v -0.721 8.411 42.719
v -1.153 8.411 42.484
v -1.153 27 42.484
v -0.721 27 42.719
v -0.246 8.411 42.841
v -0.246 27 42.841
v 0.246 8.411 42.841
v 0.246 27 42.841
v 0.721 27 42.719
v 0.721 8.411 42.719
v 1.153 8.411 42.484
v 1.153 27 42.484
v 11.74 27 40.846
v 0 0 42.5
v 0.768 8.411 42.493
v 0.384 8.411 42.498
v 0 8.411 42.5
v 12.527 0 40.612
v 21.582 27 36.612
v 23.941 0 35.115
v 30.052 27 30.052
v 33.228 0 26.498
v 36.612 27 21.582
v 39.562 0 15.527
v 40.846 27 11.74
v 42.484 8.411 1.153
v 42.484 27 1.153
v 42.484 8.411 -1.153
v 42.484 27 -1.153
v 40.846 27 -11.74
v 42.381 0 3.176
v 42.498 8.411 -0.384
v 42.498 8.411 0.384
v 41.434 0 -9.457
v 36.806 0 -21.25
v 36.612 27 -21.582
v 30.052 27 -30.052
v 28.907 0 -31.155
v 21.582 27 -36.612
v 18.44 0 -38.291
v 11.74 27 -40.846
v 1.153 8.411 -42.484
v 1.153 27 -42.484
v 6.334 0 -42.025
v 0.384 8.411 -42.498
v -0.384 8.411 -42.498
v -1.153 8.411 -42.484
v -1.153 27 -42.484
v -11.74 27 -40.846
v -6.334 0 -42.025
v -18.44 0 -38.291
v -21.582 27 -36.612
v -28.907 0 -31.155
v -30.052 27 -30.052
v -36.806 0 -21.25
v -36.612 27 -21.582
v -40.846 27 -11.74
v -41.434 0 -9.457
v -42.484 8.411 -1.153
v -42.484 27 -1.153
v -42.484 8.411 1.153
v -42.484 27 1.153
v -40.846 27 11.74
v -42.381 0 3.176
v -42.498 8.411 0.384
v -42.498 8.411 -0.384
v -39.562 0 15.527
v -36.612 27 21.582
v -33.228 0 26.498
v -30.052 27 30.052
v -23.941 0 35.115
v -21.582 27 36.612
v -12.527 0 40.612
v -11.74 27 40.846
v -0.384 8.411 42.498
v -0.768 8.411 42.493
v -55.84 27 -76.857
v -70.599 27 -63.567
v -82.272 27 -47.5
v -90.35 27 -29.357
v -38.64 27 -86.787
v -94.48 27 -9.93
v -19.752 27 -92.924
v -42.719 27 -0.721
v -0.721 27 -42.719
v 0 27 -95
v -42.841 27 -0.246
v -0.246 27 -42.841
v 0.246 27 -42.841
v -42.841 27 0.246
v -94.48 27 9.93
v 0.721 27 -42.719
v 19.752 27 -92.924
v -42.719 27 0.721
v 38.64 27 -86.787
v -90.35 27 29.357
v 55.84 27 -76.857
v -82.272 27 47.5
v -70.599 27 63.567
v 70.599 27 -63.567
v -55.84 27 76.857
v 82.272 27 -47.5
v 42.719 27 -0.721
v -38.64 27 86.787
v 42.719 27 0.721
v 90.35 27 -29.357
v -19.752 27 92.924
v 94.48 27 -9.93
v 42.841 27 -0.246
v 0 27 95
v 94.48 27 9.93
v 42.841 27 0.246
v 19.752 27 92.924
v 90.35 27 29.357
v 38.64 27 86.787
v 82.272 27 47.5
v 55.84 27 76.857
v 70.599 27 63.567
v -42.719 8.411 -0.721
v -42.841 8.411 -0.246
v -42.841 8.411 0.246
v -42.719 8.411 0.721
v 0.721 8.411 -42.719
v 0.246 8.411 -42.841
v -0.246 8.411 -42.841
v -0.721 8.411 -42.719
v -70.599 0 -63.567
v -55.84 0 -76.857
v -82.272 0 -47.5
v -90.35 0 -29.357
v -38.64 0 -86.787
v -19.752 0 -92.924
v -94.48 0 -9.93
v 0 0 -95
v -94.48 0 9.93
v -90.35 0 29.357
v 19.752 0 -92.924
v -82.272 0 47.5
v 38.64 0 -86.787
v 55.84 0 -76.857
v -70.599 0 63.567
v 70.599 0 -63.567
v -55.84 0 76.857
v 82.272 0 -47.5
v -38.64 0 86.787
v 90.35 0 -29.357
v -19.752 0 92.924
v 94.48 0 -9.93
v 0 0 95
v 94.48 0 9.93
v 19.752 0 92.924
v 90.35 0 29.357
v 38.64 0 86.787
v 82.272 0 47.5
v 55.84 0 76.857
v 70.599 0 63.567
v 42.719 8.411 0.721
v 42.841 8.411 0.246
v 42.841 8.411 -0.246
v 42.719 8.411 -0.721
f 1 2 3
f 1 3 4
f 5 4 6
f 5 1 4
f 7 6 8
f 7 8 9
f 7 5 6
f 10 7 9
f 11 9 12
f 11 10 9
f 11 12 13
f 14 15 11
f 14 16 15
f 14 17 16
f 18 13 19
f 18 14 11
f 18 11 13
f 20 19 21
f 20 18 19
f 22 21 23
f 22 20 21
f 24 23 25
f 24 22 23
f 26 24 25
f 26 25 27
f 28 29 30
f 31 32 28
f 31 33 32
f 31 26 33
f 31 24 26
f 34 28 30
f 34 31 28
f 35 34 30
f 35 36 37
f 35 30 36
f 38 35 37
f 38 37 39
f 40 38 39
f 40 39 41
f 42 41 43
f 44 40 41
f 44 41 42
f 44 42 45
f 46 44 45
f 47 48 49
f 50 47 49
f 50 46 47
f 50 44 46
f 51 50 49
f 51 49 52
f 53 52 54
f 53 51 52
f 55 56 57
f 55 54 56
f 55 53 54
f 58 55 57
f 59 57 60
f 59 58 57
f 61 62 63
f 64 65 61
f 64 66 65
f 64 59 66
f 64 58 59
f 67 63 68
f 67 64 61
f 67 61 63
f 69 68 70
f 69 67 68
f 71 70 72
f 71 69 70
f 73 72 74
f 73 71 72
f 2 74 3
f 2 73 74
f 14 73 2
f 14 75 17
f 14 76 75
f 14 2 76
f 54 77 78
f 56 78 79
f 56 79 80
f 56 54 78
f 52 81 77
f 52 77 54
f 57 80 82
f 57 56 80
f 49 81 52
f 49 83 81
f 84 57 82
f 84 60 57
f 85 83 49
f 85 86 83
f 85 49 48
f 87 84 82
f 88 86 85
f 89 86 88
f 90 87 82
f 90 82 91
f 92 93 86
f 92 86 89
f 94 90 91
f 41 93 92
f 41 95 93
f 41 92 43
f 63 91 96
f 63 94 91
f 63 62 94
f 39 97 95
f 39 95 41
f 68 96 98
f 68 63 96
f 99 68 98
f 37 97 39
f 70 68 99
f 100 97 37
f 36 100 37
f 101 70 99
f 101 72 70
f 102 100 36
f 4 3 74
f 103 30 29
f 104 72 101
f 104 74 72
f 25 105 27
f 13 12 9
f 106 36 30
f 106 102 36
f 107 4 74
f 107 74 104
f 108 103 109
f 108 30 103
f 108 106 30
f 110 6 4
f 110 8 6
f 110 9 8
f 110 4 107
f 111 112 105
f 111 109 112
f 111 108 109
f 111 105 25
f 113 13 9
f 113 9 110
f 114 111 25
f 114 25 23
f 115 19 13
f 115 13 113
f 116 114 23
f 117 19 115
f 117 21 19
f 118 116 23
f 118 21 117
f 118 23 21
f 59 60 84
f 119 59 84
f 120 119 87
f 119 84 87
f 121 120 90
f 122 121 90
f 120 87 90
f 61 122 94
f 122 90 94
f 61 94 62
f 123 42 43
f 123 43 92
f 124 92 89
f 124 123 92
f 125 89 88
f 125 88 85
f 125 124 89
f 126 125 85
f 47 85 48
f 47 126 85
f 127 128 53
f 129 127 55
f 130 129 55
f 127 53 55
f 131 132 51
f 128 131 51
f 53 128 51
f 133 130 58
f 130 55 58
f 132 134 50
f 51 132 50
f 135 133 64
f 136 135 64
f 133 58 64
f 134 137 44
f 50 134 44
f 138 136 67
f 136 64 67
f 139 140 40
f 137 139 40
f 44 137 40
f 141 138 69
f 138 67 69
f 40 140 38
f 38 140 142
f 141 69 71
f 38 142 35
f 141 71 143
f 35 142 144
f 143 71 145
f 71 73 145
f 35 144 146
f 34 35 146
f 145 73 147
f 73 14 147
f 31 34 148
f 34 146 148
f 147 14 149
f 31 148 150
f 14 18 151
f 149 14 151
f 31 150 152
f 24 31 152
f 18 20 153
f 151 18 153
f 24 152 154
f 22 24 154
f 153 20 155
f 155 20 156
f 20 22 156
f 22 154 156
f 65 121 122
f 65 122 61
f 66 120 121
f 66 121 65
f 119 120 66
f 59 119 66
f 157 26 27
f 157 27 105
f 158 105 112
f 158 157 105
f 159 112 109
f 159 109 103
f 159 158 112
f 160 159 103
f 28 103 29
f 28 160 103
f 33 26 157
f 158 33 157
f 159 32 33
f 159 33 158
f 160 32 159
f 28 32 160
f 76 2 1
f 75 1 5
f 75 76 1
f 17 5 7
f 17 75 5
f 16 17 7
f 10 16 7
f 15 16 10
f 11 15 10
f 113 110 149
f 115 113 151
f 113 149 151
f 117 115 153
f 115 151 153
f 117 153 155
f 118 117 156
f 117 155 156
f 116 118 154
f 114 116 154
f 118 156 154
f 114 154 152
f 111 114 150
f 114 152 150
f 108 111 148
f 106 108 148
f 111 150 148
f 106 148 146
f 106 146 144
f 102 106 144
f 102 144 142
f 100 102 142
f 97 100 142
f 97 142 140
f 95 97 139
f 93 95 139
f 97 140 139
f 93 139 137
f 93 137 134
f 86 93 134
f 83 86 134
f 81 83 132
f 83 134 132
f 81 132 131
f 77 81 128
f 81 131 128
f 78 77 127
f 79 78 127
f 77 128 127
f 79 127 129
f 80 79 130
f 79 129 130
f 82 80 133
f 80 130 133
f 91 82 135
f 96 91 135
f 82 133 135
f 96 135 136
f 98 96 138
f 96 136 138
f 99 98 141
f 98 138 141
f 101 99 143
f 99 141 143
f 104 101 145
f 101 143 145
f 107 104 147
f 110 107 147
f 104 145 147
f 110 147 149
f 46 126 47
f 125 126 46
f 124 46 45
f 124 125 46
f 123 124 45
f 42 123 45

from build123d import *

# Parameters (mm, degrees)
SKETCH1_R           = 95
BOSS_EXTRUDE1_DEPTH = 27
SKETCH2_R           = 42.5
CUT_EXTRUDE1_DEPTH  = 138.03649149
SKETCH3_R           = 1.973562568
CUT_EXTRUDE2_DEPTH  = 18.5885467
CIRPATTERN1_COUNT   = 4


with BuildPart() as part:
    # Sketch1 → Boss-Extrude1 (new body)
    with BuildSketch(Plane(origin=(0, 0, 0), x_dir=(1, 0, 0), z_dir=(0, 1, 0))):
        Circle(SKETCH1_R)
    extrude(amount=BOSS_EXTRUDE1_DEPTH)

    # Sketch2 → Cut-Extrude1 (cut, through all)
    with BuildSketch(Plane(origin=(0, 0, 0), x_dir=(1, 0, 0), z_dir=(0, 1, 0))):
        Circle(SKETCH2_R)
    extrude(amount=CUT_EXTRUDE1_DEPTH, mode=Mode.SUBTRACT)

    # Sketch3 → Cut-Extrude2 (cut)
    with BuildSketch(Plane(origin=(0, 27, 0), x_dir=(1, 0, 0), z_dir=(0, 1, 0))):
        with Locations((-40.882315231, 0)):
            Circle(SKETCH3_R)
    cut_extrude2 = extrude(amount=-CUT_EXTRUDE2_DEPTH, mode=Mode.SUBTRACT)

    # CirPattern1: Cut-Extrude2 ×4 about axis
    cirpattern1_axis = Axis((0, 0, 0), (0, 1, 0))
    for i in range(1, CIRPATTERN1_COUNT):
        add(cut_extrude2.rotate(cirpattern1_axis, i * 360 / CIRPATTERN1_COUNT), mode=Mode.SUBTRACT)


solid = part.part
